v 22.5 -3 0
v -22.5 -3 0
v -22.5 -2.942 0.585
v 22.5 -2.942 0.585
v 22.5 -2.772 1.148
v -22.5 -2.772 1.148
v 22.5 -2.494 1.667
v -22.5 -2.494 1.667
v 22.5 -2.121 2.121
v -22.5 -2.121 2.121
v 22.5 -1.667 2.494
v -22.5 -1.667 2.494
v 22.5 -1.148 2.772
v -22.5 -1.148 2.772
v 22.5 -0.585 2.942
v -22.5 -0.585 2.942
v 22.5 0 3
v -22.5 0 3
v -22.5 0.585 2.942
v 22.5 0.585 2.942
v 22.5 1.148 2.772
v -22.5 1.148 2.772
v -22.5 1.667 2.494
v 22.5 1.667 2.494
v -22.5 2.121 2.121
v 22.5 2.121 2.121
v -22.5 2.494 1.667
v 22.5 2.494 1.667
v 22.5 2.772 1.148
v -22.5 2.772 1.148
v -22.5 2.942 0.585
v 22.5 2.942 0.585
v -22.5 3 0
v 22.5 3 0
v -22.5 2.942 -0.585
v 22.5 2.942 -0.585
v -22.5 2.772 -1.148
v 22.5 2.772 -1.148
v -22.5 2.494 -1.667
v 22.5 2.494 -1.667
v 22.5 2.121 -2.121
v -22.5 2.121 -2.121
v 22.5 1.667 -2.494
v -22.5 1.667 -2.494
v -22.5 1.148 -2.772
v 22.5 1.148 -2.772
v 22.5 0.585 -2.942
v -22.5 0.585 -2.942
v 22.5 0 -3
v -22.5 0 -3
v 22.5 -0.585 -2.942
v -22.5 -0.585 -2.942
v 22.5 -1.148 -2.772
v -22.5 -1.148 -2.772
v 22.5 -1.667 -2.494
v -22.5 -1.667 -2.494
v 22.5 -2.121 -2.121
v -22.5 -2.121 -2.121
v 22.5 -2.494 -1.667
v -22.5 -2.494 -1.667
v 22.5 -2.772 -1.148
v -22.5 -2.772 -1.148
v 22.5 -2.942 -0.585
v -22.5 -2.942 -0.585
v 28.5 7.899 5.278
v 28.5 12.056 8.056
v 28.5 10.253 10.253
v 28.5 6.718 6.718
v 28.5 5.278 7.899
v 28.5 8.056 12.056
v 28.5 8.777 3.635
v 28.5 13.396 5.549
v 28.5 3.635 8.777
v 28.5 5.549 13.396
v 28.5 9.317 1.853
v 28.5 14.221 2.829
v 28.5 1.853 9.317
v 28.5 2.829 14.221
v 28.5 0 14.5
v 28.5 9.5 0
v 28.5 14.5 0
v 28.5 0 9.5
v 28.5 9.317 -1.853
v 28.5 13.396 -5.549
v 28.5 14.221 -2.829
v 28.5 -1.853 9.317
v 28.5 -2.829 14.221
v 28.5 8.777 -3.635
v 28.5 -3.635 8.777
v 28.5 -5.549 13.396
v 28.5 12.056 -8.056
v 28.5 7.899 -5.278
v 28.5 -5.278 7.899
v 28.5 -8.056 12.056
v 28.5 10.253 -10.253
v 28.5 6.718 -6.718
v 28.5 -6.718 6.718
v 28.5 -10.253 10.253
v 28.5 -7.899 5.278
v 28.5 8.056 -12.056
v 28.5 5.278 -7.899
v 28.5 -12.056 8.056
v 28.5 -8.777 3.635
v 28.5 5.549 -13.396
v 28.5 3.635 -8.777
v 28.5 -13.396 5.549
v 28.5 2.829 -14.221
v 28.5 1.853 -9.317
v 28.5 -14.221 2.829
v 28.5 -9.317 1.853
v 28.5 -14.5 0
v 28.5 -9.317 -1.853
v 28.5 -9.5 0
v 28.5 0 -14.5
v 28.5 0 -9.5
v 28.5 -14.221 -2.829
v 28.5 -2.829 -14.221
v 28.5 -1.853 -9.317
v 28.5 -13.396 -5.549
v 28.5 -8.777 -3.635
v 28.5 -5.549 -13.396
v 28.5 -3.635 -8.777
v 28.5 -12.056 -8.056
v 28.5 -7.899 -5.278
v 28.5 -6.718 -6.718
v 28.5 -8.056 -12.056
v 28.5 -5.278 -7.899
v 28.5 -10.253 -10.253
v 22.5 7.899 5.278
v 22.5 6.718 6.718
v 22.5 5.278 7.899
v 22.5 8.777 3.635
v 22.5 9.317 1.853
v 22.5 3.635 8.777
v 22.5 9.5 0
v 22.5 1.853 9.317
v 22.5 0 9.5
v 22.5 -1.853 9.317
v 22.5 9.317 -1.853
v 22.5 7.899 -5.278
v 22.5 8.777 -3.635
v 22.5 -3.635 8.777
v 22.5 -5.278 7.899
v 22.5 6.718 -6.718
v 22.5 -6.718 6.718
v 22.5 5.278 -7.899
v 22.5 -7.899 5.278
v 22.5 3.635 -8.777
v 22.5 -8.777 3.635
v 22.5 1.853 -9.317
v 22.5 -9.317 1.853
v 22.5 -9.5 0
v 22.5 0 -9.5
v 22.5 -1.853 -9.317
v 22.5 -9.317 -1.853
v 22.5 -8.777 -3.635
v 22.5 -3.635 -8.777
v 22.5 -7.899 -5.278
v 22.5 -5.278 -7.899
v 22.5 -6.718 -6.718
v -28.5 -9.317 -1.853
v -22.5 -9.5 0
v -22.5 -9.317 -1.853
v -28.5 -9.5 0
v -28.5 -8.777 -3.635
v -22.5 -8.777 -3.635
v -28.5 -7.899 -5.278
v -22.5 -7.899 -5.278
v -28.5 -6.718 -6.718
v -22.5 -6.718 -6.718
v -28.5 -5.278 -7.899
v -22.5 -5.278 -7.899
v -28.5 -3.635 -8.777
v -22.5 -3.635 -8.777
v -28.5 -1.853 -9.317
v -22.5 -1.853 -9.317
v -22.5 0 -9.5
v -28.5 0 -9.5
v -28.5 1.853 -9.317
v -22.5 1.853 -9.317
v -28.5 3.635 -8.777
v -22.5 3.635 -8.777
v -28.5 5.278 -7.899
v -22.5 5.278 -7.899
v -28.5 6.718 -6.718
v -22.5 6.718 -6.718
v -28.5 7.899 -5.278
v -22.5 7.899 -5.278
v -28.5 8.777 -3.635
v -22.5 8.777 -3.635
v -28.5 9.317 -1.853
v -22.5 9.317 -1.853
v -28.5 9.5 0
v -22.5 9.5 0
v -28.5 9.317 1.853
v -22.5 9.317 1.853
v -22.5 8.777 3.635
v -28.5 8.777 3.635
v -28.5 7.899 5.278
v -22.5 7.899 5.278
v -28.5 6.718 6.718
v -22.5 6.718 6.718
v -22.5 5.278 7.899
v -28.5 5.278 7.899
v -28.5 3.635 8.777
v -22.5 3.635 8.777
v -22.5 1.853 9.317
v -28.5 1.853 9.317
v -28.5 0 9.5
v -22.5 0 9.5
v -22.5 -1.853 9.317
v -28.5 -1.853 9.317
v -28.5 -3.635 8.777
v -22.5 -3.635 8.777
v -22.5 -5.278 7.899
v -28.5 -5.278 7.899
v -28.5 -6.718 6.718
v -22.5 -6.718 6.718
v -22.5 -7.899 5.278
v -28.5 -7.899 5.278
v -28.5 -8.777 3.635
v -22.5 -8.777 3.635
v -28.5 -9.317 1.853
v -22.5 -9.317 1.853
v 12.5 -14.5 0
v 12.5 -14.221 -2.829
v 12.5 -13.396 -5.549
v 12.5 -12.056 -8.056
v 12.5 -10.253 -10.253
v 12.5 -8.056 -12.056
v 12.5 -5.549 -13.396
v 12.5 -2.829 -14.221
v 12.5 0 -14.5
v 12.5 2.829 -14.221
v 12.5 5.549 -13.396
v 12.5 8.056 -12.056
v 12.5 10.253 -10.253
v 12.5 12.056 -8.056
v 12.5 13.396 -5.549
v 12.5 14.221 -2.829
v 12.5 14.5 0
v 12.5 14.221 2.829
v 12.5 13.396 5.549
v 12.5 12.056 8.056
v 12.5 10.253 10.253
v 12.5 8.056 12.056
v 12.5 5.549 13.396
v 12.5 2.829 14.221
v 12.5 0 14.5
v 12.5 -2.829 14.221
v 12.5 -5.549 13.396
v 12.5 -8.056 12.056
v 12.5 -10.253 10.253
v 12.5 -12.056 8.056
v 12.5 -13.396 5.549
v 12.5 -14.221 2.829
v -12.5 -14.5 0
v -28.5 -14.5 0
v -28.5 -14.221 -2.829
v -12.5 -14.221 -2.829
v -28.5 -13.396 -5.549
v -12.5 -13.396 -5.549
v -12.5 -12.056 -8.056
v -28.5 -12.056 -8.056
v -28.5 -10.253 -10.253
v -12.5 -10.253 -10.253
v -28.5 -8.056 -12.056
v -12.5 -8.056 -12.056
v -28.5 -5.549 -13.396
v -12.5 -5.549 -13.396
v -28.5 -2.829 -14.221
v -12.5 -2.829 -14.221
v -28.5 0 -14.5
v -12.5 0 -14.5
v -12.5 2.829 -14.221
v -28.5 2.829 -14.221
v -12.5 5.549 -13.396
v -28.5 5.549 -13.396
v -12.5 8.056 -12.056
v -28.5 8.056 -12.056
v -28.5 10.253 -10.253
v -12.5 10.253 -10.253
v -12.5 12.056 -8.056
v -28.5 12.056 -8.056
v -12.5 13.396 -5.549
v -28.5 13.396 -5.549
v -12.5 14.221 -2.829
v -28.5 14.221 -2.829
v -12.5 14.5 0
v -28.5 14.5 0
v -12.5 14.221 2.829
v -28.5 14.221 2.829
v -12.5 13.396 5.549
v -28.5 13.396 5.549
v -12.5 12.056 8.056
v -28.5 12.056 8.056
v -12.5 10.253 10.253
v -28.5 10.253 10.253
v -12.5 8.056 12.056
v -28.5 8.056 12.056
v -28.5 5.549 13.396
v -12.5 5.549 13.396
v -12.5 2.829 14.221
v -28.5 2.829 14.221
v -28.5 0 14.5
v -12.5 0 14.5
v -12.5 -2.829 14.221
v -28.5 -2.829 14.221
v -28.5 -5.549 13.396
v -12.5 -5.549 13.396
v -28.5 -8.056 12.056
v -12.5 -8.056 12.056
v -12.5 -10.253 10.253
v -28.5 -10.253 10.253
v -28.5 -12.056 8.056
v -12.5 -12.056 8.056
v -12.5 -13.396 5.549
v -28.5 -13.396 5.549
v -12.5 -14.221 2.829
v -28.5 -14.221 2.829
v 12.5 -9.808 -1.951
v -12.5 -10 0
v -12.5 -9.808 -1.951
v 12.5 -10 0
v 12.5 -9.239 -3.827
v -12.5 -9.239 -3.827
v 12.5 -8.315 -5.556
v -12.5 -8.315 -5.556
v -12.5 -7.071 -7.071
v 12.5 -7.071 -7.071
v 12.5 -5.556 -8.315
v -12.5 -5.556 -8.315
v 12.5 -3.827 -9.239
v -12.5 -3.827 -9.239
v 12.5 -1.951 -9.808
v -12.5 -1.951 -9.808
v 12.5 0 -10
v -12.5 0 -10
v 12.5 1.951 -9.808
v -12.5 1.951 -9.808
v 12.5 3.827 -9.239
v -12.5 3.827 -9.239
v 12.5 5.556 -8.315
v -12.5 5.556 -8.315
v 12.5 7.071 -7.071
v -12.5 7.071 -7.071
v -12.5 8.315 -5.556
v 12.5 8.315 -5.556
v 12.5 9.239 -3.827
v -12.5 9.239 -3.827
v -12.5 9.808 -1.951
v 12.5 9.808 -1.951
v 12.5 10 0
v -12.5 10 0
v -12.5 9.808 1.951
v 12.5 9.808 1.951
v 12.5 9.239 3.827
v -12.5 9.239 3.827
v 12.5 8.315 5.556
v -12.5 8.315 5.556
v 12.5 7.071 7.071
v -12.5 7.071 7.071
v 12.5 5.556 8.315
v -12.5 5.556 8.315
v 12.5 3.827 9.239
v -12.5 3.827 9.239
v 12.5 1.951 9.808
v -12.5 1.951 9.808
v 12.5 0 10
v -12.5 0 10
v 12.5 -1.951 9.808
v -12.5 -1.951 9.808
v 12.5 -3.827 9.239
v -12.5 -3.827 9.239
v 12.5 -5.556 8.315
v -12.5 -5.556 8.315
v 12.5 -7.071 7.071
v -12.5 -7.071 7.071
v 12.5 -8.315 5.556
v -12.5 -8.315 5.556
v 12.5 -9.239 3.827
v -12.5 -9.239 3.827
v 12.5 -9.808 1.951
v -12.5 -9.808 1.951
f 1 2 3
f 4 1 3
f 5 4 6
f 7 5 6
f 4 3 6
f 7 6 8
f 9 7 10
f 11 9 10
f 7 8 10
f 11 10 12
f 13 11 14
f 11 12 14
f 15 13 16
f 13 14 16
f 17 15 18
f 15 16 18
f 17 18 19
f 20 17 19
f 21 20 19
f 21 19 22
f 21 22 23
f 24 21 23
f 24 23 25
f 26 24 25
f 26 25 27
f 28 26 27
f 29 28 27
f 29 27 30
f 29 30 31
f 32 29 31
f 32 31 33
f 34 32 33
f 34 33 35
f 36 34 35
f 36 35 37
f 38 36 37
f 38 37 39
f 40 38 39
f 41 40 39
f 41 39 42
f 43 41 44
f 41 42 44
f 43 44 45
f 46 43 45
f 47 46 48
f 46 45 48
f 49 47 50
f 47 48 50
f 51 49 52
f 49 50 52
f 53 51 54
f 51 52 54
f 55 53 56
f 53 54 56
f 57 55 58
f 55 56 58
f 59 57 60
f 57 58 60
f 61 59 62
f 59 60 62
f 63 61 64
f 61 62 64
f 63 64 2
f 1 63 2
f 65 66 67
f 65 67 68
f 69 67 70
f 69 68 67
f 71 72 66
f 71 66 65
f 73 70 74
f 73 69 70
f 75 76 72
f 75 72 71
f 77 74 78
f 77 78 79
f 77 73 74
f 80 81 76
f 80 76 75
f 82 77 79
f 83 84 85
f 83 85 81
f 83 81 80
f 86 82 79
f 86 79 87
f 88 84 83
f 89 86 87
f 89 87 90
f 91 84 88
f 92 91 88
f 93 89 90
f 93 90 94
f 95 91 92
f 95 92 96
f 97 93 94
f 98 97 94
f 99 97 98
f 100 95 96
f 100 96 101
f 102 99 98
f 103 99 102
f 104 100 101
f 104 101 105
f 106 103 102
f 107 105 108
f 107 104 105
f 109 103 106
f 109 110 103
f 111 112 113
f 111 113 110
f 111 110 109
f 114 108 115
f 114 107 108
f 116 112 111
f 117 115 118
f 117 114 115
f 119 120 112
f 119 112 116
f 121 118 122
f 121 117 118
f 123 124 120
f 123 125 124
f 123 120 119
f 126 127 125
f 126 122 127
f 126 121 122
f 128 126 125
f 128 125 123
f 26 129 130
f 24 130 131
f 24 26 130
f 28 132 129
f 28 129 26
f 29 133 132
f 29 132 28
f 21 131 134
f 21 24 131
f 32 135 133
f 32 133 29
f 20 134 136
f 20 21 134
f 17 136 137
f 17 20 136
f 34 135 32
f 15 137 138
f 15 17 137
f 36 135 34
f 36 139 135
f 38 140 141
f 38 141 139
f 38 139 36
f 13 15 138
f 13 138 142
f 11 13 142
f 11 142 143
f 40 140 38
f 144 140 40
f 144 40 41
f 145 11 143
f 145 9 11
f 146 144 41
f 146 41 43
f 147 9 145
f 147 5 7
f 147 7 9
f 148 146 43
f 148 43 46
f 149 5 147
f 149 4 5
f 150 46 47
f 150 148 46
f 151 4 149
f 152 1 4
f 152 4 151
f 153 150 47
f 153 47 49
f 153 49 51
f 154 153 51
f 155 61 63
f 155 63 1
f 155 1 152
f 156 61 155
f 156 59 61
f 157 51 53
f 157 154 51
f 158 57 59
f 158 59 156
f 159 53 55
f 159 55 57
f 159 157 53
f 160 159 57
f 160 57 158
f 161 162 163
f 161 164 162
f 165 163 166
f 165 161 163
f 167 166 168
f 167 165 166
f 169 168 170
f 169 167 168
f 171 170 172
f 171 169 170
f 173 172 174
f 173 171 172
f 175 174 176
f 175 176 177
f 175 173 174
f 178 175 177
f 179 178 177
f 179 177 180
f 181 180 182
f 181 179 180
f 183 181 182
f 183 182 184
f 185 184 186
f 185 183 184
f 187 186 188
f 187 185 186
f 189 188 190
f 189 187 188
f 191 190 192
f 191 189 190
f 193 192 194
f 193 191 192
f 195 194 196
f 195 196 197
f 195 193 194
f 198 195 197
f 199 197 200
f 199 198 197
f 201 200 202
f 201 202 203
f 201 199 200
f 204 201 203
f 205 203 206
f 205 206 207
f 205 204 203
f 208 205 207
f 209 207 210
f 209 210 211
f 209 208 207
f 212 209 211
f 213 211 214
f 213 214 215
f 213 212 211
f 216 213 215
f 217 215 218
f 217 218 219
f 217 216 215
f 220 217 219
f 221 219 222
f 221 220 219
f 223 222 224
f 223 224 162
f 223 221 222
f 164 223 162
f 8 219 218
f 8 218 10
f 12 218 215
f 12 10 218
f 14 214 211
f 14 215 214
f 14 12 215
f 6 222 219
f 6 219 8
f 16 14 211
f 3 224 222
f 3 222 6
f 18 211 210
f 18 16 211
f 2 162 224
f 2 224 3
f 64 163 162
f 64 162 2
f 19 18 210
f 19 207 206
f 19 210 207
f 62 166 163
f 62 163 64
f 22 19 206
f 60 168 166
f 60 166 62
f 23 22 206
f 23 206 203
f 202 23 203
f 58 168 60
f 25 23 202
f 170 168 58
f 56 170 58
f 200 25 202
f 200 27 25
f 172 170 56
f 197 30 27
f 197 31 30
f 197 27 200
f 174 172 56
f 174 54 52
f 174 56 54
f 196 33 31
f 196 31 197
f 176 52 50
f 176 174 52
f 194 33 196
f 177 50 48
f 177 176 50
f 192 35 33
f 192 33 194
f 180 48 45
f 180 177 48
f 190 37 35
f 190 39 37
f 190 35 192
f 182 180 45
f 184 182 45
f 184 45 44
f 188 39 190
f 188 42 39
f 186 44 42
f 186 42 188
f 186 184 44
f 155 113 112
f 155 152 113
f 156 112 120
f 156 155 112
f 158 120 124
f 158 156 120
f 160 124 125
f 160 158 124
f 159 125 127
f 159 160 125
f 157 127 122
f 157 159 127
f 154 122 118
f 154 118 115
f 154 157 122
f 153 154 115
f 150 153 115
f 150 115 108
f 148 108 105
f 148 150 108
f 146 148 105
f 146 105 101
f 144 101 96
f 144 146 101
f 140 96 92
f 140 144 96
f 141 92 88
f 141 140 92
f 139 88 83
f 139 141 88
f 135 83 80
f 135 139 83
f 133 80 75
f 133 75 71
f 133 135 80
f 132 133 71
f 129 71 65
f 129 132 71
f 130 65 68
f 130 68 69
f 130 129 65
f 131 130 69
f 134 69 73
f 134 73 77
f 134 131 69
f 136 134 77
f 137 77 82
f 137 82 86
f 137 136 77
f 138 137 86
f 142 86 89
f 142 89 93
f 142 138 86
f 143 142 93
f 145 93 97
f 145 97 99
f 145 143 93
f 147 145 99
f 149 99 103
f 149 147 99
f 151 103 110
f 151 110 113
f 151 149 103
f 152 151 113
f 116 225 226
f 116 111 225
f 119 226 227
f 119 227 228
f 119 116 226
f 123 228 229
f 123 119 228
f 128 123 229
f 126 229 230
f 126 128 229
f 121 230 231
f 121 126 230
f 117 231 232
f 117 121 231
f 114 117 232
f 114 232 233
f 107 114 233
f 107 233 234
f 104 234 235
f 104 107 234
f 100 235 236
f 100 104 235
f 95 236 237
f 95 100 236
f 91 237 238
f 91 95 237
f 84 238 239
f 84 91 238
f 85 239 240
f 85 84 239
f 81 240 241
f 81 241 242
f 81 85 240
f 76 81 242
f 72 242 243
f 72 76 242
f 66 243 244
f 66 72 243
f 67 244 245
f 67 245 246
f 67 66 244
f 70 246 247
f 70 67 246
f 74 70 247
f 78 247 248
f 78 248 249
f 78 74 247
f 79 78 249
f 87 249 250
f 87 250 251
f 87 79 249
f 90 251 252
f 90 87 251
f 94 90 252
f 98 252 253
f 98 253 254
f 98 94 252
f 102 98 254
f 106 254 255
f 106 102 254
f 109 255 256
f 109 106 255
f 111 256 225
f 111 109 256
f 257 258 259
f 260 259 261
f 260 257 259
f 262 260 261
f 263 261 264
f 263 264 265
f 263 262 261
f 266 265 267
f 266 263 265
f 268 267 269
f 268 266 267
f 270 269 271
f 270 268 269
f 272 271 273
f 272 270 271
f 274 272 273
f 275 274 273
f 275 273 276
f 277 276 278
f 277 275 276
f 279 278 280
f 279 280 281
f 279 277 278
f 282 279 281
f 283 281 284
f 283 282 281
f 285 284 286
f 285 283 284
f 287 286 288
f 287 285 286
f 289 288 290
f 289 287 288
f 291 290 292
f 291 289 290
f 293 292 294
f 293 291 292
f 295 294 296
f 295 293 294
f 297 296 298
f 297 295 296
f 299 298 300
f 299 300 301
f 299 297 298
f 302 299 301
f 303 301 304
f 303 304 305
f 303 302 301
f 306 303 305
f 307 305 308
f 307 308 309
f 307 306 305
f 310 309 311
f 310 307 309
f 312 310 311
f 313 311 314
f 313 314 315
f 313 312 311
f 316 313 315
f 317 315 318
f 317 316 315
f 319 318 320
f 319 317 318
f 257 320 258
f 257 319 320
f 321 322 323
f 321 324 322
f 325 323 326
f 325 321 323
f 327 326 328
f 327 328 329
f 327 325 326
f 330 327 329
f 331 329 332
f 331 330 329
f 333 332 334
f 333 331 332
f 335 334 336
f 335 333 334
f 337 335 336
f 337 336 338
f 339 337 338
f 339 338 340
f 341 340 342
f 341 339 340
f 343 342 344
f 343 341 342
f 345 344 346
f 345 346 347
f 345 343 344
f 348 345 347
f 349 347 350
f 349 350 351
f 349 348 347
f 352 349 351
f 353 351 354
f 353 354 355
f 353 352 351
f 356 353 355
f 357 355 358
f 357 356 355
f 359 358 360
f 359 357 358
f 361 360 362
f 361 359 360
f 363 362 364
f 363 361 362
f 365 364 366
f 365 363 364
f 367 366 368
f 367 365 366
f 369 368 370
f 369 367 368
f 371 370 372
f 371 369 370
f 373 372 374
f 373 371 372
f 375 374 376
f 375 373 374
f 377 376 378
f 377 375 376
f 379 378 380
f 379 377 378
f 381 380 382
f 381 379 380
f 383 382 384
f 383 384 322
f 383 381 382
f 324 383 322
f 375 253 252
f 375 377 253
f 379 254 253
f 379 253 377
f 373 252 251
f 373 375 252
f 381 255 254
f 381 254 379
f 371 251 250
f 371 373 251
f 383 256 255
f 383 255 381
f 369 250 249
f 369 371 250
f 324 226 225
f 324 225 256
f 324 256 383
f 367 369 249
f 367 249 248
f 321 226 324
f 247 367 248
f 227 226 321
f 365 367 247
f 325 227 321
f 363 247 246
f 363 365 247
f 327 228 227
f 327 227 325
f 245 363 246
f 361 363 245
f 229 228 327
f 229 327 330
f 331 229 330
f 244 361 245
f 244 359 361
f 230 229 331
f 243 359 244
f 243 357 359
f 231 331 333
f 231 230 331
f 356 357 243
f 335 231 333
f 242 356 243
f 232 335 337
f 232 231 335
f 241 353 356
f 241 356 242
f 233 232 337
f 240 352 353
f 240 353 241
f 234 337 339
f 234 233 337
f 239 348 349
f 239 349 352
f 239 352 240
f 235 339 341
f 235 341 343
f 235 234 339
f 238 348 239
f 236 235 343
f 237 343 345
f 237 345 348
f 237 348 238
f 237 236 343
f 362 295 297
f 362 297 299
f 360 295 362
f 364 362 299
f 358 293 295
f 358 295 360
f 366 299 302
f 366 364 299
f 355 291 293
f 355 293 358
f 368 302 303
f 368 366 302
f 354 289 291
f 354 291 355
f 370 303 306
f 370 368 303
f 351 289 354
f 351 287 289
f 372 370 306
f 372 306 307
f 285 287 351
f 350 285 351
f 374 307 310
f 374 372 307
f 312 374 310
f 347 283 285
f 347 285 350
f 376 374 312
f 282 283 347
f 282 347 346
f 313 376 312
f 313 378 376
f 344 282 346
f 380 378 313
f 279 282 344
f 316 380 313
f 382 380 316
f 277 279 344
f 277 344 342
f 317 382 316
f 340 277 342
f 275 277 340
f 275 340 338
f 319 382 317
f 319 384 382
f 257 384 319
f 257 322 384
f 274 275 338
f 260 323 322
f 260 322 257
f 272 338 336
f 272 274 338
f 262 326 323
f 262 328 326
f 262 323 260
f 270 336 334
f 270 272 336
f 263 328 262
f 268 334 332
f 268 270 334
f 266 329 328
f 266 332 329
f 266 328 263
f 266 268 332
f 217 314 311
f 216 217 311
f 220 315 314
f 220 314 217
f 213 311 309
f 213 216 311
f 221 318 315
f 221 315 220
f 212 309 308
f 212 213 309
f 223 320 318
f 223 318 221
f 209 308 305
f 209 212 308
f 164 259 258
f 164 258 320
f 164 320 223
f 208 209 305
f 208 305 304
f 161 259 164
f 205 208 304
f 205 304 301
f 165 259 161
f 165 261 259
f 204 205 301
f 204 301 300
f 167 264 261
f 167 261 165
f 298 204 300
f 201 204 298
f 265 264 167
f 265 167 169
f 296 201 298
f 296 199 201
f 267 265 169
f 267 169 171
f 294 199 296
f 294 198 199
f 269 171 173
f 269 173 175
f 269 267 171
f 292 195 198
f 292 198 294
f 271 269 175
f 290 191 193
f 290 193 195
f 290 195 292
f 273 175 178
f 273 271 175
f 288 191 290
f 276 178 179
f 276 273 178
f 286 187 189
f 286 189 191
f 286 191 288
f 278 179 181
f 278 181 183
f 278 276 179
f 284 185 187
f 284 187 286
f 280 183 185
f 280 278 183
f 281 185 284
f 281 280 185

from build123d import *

# Parameters (mm, degrees)
SKETCH2_R          = 3
CUT_EXTRUDE1_DEPTH = 55.968172609


with BuildPart() as part:
    # Sketch1 → Revolve1 (revolve)
    with BuildSketch(Plane.XY, mode=Mode.PRIVATE) as revolve1_sk:
        Polygon((-12.5, 10), (12.5, 10), (12.5, 14.5), (28.5, 14.5), (28.5, 9.5), (22.5, 9.5), (22.5, 0), (-22.5, 0), (-22.5, 9.5), (-28.5, 9.5), (-28.5, 14.5), (-12.5, 14.5), align=None)
    revolve(revolve1_sk.sketch.rotate(Axis((-22.5, 0, 0), (1, 0, 0)), 180), axis=Axis((-22.5, 0, 0), (1, 0, 0)))

    # Sketch2 → Cut-Extrude1 (cut, through all)
    with BuildSketch(Plane.ZY.offset(22.5)):
        with Locations(Location((0, 0, 0), (0, 0, 270))):
            Circle(SKETCH2_R)
    extrude(amount=-CUT_EXTRUDE1_DEPTH, mode=Mode.SUBTRACT)


solid = part.part
